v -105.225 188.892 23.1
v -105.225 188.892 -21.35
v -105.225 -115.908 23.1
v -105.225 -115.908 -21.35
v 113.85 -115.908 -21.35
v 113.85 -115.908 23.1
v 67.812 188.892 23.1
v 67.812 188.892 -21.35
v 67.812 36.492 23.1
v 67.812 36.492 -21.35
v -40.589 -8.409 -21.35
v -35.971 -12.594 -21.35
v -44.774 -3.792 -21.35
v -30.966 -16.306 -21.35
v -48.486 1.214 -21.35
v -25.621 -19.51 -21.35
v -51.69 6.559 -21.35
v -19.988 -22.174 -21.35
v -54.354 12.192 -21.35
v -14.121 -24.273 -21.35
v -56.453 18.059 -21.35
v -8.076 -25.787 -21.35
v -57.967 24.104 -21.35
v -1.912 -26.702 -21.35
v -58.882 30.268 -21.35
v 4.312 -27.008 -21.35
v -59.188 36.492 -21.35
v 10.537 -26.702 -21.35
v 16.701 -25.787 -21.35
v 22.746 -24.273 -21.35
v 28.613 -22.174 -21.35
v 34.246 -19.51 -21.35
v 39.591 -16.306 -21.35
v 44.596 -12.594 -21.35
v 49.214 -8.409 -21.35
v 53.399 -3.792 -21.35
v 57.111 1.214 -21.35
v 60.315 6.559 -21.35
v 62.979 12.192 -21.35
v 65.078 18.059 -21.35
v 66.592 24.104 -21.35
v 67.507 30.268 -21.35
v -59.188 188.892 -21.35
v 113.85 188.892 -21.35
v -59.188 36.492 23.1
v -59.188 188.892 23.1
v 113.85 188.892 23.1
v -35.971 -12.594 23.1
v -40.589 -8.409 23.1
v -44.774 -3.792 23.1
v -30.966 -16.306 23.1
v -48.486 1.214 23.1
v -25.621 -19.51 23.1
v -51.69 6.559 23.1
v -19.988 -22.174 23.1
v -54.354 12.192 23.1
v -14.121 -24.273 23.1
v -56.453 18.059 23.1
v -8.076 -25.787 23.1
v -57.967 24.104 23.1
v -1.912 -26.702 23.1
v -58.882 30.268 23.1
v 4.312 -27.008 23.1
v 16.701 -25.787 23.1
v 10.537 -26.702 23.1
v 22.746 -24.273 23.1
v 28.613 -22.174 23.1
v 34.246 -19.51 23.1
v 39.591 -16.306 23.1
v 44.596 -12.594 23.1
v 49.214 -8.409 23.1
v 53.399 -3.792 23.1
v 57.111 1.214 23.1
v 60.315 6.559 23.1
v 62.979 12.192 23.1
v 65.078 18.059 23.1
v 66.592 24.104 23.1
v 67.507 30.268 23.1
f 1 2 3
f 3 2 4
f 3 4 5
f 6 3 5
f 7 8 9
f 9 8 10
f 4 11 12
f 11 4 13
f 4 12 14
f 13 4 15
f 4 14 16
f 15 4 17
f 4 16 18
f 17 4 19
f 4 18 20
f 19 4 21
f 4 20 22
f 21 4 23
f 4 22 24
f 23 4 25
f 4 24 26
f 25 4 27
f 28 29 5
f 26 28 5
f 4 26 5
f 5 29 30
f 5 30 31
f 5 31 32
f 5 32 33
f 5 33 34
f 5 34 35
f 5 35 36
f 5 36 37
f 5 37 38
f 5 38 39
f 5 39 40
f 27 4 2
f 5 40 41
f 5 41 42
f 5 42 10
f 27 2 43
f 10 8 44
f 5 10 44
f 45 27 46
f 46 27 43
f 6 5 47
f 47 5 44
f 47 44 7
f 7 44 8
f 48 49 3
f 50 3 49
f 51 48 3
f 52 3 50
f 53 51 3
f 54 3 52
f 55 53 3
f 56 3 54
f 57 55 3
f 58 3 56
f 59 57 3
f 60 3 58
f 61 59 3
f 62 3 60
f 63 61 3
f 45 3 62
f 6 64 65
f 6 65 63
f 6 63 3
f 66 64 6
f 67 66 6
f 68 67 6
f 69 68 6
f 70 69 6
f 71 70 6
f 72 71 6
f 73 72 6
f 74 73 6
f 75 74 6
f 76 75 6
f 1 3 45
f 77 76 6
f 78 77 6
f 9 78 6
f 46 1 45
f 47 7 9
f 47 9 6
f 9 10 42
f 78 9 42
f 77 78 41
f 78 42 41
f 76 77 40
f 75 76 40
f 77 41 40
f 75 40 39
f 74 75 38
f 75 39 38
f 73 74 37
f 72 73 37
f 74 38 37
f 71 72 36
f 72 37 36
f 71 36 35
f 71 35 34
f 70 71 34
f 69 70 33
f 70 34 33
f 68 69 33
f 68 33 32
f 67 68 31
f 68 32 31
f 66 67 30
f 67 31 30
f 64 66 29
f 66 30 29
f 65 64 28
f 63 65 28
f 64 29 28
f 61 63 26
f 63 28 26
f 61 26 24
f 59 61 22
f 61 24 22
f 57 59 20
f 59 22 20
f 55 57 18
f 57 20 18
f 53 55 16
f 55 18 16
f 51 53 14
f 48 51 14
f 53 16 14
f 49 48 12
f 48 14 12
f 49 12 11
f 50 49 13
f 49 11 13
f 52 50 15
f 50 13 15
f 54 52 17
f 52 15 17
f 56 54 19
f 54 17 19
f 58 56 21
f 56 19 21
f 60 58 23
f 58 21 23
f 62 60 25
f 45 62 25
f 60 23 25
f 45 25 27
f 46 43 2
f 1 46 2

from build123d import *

# Parameters (mm, degrees)
BOSS_EXTRUDE1_DEPTH = 1.75
SCALE1_SCALE        = 25.4


with BuildPart() as part:
    # Sketch1 → Boss-Extrude1 (new body)
    with BuildSketch(Plane.XY):
        with BuildLine():
            Line((0, 12), (0, 0))
            Line((0, 0), (8.625, 0))
            Line((8.625, 0), (8.625, 12))
            Line((8.625, 12), (6.8125, 12))
            Line((6.8125, 12), (6.8125, 6))
            ThreePointArc((6.8125, 6), (4.3125, 3.5), (1.8125, 6))
            Line((1.8125, 6), (1.8125, 12))
            Line((1.8125, 12), (0, 12))
        make_face()
    extrude(amount=BOSS_EXTRUDE1_DEPTH)


with BuildPart() as part_1:
    # Scale1: scaled about (4.3125, 4.750311237, 0.875)
    add(part.part.scale(SCALE1_SCALE).moved(Location((-105.225, -115.907594183, -21.35))))


solid = part_1.part
